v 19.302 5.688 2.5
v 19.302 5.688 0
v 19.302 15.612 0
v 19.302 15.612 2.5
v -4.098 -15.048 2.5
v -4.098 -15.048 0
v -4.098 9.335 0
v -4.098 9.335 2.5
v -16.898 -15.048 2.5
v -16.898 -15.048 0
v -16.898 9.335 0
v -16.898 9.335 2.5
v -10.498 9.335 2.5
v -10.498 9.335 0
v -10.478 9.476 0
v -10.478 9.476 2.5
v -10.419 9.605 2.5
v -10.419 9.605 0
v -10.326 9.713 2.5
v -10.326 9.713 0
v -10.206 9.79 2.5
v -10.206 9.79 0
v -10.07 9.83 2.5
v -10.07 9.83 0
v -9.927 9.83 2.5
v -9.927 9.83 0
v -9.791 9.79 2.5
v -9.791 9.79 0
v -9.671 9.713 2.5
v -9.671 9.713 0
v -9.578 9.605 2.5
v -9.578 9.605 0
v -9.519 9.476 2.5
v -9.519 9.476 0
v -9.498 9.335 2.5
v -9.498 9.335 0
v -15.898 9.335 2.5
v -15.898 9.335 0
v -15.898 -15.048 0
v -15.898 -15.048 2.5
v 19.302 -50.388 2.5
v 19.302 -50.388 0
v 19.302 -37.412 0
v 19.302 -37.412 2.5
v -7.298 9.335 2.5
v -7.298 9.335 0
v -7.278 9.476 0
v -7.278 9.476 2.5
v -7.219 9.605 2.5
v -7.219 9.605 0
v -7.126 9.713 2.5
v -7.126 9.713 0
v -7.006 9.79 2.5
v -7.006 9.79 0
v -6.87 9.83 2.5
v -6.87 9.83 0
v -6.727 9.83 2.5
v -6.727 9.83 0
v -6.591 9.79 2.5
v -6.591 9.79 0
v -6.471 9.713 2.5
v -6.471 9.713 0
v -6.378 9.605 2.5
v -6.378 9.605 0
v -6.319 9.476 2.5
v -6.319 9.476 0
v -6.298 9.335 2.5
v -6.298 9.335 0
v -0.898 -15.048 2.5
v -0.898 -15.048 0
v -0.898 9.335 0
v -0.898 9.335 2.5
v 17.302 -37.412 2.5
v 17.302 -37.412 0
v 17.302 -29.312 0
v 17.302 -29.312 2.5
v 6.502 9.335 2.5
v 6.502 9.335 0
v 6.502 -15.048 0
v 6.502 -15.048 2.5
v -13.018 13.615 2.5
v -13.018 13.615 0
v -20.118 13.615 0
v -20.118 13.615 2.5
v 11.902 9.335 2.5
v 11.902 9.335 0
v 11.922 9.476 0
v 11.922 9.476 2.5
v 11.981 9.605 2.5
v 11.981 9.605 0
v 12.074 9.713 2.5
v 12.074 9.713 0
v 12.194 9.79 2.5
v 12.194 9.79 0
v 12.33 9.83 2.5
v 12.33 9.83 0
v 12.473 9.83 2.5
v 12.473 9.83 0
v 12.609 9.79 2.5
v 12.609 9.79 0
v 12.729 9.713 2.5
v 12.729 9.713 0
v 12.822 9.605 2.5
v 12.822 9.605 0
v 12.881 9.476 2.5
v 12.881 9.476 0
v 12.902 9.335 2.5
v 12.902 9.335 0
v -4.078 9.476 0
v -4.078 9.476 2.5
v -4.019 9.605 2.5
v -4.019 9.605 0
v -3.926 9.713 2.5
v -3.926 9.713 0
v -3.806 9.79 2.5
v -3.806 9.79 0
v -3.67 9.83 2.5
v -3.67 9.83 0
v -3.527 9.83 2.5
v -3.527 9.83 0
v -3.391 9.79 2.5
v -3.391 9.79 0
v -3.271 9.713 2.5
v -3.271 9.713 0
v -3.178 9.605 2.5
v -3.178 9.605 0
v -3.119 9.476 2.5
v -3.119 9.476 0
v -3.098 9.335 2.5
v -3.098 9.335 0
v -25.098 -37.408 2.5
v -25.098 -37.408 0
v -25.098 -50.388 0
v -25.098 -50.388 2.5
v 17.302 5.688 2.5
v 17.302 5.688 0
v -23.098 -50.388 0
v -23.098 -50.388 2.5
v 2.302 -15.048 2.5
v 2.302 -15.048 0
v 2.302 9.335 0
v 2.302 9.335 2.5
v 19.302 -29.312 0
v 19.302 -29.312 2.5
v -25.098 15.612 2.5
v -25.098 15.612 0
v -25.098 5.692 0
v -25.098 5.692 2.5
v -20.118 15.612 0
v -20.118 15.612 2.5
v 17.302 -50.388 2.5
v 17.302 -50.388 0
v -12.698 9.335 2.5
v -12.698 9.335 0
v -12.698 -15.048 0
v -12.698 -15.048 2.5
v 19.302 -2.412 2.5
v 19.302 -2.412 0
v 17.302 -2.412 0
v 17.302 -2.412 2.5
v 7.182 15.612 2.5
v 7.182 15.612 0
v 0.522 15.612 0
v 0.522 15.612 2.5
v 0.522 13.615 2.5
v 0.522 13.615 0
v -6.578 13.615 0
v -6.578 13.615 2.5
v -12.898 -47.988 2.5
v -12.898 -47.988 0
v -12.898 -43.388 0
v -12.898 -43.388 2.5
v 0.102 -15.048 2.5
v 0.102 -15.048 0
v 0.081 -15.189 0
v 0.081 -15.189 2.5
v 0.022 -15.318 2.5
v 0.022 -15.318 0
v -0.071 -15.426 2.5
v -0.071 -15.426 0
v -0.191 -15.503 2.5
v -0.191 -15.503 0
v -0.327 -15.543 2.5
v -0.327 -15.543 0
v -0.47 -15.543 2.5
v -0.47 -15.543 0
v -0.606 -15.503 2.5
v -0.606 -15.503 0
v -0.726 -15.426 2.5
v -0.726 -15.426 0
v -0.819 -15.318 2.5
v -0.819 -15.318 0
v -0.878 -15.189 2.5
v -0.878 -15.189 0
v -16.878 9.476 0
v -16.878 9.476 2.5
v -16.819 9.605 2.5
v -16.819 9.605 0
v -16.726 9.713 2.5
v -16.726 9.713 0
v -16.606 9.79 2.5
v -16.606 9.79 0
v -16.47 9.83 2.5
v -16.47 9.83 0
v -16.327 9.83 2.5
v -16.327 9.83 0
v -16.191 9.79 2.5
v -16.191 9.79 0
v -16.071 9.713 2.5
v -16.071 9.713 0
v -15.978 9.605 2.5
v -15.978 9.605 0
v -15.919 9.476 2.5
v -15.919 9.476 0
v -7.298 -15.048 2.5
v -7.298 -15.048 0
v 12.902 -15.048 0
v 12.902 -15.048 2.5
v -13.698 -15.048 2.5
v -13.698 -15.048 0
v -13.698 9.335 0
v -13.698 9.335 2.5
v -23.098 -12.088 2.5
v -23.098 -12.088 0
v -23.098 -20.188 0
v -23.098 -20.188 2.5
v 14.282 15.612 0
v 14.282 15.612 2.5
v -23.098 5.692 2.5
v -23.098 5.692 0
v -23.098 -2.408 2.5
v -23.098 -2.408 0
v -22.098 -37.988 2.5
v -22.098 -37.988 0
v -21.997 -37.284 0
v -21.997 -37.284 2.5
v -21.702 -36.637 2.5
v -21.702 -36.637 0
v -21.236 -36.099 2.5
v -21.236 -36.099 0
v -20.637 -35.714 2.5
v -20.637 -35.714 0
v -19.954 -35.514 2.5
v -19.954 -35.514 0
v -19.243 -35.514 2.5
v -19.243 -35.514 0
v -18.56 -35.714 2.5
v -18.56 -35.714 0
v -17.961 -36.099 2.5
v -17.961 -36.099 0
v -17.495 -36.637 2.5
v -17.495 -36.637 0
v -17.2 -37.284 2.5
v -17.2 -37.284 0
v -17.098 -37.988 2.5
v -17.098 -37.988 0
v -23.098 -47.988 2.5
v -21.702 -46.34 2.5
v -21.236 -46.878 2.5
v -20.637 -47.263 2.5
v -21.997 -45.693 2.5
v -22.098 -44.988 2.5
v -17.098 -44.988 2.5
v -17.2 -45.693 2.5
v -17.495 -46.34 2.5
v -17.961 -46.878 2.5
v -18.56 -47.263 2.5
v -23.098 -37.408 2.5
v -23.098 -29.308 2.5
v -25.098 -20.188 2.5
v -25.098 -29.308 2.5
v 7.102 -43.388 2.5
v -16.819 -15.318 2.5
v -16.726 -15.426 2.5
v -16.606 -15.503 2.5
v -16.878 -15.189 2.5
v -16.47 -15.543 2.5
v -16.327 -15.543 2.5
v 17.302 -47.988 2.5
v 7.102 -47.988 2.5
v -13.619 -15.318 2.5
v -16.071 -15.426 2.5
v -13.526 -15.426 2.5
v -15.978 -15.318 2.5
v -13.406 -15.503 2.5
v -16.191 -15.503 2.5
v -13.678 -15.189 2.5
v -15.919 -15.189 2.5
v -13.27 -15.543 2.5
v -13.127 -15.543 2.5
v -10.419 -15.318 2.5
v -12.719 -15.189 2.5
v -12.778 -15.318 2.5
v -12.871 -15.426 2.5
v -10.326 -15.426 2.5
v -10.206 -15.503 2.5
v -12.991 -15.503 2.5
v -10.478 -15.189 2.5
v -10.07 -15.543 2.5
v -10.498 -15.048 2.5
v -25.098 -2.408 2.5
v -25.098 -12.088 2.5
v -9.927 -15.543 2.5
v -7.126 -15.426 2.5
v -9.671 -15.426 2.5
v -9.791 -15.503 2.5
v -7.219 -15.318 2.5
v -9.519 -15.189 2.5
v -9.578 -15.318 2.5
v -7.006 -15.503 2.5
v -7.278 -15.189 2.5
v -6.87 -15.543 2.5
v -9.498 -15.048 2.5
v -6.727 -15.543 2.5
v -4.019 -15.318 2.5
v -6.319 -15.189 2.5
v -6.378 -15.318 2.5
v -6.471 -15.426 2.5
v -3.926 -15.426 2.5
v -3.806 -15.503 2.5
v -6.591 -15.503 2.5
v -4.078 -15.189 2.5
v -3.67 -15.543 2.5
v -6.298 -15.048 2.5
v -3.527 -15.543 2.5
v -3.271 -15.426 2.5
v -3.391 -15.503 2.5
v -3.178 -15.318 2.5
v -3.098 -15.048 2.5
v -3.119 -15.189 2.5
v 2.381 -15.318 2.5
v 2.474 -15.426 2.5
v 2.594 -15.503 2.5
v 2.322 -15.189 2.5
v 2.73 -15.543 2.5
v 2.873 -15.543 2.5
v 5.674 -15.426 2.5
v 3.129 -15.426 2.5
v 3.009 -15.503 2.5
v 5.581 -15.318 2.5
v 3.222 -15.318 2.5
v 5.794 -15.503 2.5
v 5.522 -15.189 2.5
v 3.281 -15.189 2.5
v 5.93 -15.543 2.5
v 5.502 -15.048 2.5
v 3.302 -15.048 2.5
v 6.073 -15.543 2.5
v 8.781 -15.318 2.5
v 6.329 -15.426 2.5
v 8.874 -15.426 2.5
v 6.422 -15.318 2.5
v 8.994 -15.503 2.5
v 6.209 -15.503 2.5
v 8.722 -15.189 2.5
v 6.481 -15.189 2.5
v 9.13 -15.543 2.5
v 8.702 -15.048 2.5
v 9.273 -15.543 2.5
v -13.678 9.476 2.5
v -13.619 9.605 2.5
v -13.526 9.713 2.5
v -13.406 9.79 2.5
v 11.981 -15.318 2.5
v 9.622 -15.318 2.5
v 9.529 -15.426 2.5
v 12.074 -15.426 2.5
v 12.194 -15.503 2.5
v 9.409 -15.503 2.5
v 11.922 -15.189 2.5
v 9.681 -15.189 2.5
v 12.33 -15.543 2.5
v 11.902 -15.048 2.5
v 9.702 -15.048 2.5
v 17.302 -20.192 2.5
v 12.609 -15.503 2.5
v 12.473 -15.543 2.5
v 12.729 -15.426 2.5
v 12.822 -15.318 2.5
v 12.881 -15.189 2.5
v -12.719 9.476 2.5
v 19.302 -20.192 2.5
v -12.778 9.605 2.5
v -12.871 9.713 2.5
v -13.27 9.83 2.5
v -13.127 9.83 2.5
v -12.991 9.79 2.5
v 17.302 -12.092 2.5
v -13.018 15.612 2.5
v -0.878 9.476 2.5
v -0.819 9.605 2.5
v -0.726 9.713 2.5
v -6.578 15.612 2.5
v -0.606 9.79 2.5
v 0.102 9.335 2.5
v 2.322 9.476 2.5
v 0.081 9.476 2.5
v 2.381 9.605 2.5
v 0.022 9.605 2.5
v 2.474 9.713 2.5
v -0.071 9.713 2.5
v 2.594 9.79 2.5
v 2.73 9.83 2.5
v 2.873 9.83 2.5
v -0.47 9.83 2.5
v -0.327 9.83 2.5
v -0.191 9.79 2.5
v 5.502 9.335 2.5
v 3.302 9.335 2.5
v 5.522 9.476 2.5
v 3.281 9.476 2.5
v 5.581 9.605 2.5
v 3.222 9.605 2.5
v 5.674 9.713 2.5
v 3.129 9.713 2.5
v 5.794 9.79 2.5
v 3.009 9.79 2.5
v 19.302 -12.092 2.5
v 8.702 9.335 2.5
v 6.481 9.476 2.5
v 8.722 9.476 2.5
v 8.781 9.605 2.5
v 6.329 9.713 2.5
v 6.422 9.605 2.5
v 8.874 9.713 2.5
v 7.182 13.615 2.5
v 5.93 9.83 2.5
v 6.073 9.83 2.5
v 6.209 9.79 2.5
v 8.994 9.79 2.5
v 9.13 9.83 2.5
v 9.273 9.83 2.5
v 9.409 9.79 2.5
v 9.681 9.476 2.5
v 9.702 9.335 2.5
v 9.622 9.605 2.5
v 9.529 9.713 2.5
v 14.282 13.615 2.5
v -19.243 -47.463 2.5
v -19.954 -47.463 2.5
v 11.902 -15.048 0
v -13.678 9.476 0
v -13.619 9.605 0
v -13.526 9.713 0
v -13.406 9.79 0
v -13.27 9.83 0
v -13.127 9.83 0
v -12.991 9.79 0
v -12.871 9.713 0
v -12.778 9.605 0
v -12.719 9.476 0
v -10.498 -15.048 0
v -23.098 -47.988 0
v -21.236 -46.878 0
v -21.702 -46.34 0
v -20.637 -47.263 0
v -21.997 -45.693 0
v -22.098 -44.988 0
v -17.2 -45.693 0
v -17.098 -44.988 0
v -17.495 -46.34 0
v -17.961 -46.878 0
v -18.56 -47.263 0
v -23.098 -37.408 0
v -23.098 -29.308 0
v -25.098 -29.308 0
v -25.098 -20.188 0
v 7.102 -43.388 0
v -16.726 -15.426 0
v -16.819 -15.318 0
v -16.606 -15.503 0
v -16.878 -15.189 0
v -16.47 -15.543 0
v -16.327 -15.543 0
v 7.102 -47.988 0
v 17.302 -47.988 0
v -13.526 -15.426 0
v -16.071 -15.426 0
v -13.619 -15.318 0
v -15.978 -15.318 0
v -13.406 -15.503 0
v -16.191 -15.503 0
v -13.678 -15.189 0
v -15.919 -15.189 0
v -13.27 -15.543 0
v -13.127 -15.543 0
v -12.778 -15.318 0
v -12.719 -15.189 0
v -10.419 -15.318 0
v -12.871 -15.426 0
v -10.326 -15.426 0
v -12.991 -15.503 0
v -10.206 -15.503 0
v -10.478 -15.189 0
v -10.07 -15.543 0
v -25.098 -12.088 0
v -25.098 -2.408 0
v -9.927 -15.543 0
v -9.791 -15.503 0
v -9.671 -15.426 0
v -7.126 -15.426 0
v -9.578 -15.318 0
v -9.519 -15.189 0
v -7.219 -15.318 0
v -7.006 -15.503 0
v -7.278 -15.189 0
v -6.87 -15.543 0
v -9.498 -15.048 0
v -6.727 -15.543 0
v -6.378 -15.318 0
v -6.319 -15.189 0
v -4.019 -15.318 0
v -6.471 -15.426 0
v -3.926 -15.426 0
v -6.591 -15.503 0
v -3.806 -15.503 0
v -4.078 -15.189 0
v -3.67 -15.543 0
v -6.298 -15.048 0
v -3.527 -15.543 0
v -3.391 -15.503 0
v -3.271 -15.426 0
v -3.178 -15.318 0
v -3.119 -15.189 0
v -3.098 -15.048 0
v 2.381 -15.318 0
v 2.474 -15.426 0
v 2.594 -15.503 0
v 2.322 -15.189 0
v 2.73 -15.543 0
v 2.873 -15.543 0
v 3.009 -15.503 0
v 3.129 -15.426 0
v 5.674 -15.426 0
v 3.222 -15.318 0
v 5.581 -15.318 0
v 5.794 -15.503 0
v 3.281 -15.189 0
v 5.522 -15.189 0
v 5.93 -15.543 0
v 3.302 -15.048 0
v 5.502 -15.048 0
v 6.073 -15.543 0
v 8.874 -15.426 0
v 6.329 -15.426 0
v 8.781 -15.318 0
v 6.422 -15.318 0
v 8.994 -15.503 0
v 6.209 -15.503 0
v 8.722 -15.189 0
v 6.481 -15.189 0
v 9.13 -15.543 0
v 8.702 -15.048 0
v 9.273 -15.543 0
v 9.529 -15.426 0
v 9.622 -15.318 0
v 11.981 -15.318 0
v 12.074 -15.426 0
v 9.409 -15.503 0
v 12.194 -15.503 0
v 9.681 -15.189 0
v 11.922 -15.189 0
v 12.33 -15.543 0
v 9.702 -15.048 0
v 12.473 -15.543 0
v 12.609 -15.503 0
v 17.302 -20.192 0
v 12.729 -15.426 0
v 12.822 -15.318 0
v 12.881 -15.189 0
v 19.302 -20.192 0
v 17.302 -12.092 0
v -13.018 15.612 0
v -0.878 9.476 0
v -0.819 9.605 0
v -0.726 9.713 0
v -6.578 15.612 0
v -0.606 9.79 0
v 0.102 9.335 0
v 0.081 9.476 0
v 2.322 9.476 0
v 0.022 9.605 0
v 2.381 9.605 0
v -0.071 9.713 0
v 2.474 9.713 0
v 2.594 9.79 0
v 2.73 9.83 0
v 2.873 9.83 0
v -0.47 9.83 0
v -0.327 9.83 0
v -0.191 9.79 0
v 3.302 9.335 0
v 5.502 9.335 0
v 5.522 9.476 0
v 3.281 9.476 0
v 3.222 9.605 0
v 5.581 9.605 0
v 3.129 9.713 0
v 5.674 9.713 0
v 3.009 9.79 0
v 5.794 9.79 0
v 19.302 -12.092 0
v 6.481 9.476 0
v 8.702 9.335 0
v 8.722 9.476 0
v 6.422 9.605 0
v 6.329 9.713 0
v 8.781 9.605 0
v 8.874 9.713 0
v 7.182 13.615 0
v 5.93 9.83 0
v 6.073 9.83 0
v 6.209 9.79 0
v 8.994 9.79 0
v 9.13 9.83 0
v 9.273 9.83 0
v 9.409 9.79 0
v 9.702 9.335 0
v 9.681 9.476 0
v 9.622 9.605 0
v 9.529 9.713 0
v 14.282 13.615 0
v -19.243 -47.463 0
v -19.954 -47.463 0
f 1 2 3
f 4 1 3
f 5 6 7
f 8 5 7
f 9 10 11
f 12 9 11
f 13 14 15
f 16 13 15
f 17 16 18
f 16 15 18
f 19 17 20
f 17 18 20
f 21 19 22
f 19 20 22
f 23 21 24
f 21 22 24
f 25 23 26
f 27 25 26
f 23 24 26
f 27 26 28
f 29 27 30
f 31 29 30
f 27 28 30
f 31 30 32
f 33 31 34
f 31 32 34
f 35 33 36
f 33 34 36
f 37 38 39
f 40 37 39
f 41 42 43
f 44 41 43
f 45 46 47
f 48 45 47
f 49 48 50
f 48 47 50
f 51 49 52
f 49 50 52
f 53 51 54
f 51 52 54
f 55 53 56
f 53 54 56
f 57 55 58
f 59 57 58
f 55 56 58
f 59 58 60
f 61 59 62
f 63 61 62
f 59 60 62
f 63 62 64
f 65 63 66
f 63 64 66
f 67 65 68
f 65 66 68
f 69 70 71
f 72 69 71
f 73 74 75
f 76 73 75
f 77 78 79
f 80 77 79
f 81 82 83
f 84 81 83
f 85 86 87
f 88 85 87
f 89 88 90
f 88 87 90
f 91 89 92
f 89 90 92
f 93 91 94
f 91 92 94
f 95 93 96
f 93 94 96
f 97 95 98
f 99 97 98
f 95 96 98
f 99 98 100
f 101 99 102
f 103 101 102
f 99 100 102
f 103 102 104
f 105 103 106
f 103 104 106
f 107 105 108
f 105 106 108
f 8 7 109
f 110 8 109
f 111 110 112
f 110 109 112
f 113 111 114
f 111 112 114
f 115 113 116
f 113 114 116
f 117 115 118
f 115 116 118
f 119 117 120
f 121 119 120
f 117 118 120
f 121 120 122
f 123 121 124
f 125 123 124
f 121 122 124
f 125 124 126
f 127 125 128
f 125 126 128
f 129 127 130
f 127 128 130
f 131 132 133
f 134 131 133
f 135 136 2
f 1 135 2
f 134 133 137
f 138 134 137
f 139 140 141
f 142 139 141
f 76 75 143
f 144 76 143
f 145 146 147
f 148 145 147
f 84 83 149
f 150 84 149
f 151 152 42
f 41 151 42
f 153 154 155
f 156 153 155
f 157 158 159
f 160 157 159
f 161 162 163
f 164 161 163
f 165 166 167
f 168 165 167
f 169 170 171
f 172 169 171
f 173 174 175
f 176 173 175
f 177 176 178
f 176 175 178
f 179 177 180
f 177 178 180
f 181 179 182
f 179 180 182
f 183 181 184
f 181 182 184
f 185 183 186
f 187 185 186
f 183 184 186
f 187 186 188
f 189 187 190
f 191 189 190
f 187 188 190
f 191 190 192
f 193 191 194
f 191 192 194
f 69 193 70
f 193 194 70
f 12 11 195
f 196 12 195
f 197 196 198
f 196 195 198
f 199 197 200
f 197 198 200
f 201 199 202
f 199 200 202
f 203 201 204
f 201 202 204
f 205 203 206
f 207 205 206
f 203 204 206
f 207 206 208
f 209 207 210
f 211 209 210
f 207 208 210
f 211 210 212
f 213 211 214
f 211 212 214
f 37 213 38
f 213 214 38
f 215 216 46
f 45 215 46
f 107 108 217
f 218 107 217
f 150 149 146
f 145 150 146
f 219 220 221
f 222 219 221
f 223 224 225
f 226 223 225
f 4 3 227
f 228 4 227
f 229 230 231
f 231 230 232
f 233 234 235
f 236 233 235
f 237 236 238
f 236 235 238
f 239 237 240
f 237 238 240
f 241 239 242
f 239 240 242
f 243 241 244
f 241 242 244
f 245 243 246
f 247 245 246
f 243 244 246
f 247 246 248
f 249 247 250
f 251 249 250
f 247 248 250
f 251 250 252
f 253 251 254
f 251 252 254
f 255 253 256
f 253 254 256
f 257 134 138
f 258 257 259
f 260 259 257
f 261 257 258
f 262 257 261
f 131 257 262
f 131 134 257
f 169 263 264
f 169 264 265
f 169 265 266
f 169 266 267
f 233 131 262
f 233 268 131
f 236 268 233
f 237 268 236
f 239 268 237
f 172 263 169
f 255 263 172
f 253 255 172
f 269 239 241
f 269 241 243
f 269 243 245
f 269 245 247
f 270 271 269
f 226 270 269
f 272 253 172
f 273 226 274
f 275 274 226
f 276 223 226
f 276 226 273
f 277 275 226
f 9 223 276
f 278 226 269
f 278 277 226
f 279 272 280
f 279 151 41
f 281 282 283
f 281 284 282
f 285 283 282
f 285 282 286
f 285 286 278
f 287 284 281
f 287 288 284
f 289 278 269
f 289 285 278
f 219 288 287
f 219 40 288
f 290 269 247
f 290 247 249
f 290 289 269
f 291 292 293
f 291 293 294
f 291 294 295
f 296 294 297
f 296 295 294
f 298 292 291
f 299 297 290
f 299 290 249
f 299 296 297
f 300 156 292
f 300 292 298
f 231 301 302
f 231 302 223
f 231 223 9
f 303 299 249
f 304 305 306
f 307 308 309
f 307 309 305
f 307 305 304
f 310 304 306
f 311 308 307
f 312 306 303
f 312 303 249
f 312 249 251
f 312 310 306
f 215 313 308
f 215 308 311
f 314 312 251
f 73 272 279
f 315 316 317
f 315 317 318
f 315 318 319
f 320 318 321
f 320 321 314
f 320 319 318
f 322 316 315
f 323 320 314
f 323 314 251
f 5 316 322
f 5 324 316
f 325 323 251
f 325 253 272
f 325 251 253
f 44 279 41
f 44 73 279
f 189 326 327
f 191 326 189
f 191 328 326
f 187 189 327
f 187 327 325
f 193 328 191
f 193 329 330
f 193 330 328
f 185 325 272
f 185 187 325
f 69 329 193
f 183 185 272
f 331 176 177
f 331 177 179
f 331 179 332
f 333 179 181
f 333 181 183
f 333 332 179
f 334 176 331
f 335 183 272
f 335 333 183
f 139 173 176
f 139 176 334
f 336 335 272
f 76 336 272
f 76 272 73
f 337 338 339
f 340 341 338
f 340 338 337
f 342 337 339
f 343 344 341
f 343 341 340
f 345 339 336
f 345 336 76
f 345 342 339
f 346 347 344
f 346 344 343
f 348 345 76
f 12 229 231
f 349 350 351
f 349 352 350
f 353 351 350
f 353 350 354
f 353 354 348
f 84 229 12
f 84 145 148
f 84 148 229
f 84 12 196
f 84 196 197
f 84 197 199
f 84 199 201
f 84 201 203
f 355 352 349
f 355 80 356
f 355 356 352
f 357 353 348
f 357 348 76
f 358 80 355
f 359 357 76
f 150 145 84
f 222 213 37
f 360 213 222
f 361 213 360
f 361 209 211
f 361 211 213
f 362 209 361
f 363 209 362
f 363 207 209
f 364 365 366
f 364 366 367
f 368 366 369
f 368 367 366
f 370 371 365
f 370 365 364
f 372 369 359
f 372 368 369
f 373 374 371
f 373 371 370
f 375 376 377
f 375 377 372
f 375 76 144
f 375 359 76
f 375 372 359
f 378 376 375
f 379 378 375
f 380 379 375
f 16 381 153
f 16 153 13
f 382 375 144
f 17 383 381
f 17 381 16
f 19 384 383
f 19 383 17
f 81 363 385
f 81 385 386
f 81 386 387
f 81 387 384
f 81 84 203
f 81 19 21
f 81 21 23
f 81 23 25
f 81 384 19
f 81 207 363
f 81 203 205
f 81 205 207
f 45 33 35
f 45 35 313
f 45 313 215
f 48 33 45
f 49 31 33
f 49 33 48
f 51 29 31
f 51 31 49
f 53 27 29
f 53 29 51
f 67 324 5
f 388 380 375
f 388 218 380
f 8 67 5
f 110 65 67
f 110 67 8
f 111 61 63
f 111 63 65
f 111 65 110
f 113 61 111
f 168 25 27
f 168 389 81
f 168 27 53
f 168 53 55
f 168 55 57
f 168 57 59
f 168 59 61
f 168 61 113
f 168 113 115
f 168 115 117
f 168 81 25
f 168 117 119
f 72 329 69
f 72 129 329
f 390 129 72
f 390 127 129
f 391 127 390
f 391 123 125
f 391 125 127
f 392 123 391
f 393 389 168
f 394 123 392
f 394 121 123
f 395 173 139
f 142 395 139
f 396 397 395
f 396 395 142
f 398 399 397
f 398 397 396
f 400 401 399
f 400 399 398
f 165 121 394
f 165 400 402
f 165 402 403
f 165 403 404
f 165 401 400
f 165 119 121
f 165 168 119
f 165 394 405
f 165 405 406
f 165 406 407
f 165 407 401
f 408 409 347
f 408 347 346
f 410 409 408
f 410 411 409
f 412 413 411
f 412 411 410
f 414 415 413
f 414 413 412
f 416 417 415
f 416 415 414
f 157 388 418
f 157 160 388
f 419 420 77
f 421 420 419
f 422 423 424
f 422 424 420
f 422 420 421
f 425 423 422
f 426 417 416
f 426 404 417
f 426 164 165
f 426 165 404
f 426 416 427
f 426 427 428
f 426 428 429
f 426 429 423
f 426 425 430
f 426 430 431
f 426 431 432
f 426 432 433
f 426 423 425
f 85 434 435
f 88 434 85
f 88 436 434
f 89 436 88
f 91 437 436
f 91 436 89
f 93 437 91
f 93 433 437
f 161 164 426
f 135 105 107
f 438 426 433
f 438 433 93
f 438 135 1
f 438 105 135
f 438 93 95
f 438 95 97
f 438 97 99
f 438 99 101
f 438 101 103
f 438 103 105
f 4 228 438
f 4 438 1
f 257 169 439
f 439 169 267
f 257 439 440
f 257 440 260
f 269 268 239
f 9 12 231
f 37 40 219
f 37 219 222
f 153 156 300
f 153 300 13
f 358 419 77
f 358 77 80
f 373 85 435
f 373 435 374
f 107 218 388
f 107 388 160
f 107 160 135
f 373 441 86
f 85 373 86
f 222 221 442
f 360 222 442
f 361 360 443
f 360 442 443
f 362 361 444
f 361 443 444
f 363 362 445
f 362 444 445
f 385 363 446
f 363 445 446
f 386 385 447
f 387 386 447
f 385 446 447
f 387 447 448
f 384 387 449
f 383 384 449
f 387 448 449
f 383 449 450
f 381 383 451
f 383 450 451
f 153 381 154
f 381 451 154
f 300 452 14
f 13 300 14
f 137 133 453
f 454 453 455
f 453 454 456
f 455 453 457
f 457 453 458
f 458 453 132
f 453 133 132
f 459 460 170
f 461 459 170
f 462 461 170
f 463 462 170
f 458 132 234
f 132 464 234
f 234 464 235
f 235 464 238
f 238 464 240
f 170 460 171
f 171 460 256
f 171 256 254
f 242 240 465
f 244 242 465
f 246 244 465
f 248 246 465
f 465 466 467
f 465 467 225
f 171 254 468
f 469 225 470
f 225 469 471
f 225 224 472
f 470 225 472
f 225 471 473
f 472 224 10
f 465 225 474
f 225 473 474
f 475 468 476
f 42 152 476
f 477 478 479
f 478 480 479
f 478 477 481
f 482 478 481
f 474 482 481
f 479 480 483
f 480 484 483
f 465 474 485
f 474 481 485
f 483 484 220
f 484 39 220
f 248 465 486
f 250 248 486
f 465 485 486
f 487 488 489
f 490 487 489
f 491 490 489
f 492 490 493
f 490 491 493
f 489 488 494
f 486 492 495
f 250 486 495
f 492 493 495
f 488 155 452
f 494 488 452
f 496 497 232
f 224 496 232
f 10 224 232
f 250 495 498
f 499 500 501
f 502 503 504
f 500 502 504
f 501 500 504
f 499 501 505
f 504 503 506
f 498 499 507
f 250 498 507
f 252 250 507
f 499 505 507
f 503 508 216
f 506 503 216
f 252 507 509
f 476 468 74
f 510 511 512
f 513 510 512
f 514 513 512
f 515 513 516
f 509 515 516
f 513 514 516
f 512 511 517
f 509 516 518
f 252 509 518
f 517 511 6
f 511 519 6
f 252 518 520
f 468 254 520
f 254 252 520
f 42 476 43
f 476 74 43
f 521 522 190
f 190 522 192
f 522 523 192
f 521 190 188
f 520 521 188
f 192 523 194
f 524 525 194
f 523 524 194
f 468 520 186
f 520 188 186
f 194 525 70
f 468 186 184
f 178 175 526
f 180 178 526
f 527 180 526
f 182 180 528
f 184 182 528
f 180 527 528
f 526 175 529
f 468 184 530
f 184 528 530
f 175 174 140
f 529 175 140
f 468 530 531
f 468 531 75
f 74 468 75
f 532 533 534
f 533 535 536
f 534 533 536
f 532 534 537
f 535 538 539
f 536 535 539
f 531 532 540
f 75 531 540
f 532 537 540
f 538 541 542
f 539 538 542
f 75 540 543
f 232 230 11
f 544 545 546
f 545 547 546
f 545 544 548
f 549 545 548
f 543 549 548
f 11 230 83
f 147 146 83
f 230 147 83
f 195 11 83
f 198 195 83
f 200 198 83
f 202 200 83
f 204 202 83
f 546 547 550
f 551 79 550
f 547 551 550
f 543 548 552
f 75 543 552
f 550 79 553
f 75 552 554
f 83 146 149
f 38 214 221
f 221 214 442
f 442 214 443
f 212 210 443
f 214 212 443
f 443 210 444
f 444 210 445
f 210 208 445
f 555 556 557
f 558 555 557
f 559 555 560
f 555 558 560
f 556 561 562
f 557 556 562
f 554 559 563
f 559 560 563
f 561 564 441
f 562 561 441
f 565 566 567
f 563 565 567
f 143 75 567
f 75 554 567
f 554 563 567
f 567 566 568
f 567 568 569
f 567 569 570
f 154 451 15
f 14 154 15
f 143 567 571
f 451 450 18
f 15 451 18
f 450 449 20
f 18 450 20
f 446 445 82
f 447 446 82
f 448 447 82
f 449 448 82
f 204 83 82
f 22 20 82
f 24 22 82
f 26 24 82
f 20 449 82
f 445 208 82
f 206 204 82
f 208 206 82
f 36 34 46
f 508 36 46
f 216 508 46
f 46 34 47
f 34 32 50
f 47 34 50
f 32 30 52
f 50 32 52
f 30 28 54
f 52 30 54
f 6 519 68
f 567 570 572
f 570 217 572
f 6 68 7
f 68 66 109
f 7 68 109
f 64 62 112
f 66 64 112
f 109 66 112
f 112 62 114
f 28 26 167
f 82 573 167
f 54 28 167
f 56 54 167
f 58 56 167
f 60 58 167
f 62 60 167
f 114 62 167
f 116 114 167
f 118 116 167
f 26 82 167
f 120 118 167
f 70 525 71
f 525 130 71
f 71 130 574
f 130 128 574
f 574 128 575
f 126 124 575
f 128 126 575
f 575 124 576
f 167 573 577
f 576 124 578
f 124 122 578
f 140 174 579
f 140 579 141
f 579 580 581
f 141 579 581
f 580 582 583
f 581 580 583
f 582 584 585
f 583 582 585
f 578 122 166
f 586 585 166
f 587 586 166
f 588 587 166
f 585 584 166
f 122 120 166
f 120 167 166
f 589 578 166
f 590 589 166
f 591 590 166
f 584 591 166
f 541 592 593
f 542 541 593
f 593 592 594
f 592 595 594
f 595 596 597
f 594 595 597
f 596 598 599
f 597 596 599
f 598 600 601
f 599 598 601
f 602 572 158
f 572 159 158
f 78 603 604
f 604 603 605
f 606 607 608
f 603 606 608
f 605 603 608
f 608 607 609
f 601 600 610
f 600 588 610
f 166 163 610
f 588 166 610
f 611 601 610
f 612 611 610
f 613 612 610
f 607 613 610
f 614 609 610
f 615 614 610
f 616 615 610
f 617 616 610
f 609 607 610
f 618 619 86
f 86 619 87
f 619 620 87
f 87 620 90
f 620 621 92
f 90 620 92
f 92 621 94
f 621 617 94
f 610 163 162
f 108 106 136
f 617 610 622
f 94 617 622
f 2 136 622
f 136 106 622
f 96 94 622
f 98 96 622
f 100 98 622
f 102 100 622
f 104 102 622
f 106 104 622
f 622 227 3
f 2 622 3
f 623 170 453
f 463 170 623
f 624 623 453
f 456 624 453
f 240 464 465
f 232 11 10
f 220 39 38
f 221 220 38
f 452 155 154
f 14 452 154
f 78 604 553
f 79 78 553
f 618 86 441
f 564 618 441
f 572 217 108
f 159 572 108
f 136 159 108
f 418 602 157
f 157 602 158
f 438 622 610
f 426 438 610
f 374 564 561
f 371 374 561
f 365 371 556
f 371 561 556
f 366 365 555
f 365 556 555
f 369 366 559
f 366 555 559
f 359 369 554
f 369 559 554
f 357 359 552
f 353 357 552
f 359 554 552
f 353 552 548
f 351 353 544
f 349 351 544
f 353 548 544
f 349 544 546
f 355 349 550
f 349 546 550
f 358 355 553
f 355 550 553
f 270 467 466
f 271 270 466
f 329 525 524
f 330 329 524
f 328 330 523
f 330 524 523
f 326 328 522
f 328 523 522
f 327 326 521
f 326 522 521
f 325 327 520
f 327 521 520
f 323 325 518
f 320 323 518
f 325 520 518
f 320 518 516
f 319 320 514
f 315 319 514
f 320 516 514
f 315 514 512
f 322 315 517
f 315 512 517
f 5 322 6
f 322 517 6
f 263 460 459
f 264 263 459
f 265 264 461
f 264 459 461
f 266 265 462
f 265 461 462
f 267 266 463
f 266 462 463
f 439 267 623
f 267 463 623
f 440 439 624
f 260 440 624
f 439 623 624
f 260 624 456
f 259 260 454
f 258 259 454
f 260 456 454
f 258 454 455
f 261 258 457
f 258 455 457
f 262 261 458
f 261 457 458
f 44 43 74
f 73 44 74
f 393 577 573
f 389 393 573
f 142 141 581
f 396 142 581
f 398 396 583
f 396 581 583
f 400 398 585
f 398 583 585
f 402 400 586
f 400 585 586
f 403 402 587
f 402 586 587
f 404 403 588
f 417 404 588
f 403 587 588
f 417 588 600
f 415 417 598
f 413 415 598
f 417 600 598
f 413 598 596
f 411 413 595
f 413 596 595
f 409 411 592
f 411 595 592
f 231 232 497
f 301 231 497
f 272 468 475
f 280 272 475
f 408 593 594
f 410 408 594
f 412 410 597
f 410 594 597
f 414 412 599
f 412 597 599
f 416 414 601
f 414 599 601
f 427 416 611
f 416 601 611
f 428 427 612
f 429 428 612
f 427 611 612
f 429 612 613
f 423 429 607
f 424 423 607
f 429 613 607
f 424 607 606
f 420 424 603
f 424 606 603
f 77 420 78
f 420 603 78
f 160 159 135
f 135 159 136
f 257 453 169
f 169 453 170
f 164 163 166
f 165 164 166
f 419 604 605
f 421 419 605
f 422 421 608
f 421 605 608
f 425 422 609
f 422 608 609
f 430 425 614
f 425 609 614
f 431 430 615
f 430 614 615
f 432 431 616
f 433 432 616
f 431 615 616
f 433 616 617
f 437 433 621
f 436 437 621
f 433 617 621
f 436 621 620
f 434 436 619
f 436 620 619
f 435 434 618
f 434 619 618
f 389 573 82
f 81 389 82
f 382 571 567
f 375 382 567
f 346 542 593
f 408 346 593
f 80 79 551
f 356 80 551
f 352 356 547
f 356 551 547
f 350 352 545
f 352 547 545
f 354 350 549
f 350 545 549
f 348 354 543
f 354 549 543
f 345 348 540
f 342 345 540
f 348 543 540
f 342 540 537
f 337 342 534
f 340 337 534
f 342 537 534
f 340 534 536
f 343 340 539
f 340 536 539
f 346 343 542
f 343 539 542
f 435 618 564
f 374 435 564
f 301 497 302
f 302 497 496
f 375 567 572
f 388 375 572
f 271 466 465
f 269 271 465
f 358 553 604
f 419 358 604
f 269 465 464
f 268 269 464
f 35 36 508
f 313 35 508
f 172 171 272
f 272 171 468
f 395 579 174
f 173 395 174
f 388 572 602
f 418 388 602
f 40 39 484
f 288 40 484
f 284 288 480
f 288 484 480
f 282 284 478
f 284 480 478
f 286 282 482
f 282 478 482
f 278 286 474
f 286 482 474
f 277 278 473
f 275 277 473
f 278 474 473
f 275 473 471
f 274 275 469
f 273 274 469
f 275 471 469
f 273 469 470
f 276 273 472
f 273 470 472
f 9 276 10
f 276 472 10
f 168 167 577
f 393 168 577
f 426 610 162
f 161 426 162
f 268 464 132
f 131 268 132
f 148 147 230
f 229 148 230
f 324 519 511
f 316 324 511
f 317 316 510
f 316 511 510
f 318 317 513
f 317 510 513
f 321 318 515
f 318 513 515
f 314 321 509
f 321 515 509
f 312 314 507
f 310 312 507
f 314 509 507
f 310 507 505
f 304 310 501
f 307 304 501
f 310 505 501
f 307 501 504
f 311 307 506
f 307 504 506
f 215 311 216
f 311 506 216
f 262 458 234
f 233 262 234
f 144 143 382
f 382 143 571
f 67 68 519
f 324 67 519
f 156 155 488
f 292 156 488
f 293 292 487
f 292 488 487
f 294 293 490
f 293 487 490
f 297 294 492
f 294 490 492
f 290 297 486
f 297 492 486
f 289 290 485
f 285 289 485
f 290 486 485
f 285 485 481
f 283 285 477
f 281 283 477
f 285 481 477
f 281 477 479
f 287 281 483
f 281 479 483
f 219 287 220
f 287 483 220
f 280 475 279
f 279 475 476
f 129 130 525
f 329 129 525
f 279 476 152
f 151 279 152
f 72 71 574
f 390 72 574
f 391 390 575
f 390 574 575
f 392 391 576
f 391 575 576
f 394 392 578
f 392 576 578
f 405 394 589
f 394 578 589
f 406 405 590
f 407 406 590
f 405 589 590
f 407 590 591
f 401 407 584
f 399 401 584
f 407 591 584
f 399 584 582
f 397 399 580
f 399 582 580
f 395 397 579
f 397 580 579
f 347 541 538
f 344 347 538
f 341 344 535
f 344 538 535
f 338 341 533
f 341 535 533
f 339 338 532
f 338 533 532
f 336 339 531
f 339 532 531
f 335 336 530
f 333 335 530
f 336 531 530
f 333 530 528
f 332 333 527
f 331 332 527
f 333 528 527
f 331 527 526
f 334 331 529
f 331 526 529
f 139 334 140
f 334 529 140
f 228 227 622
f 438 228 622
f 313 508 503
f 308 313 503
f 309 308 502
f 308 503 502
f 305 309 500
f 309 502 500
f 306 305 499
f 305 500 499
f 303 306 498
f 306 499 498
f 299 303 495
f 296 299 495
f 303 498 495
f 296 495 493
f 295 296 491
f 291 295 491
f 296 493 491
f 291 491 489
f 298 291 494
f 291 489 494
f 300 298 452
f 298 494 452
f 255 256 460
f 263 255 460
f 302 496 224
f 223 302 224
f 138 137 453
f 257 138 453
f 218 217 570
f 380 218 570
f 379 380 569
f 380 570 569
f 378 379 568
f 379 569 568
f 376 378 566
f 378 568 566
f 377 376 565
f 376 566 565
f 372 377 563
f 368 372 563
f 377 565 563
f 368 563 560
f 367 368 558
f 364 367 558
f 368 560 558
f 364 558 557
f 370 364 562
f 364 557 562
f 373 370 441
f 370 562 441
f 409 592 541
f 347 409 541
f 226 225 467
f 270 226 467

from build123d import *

# Parameters (mm, degrees)
RESSALTO_EXTRUS_O1_DEPTH = 2.5


with BuildPart() as part:
    # Esboço1 → Ressalto-extrusão1 (new body)
    with BuildSketch(Plane.XY):
        Polygon((-25.098396903, -50.388461043), (-23.098396903, -50.388461043), (-23.098396903, -47.988461043), (-12.898396903, -47.988461043), (-12.898396903, -43.388461043), (7.101603097, -43.388461043), (7.101603097, -47.988461043), (17.301603097, -47.988461043), (17.301603097, -50.388461043), (19.301603097, -50.388461043), (19.301603097, -37.412155135), (17.301603097, -37.412155135), (17.301603097, -29.312155135), (19.301603097, -29.312155135), (19.301603097, -20.19154649), (17.301603097, -20.19154649), (17.301603097, -12.09154649), (19.301603097, -12.09154649), (19.301603097, -2.411827174), (17.301603097, -2.411827174), (17.301603097, 5.688172826), (19.301603097, 5.688172826), (19.301603097, 15.611538957), (14.281603097, 15.611538957), (14.281603097, 13.615257293), (7.181603097, 13.615257293), (7.181603097, 15.611538957), (0.521603097, 15.611538957), (0.521603097, 13.615257293), (-6.578396903, 13.615257293), (-6.578396903, 15.611538957), (-13.018396903, 15.611538957), (-13.018396903, 13.615257293), (-20.118396903, 13.615257293), (-20.118396903, 15.611538957), (-25.098396903, 15.611538957), (-25.098396903, 5.691538957), (-23.098396903, 5.691538957), (-23.098396903, -2.408461043), (-25.098396903, -2.408461043), (-25.098396903, -12.088461043), (-23.098396903, -12.088461043), (-23.098396903, -20.188461043), (-25.098396903, -20.188461043), (-25.098396903, -29.308461043), (-23.098396903, -29.308461043), (-23.098396903, -37.408461043), (-25.098396903, -37.408461043), align=None)
        with BuildLine():
            ThreePointArc((-22.098396903, -37.988461043), (-19.598396903, -35.488461043), (-17.098396903, -37.988461043))
            Line((-17.098396903, -37.988461043), (-17.098396903, -44.988461043))
            ThreePointArc((-17.098396903, -44.988461043), (-19.598396903, -47.488461043), (-22.098396903, -44.988461043))
            Line((-22.098396903, -44.988461043), (-22.098396903, -37.988461043))
        make_face(mode=Mode.SUBTRACT)
        with BuildLine():
            ThreePointArc((-16.898396903, 9.334849068), (-16.398396903, 9.834849068), (-15.898396903, 9.334849068))
            Line((-15.898396903, 9.334849068), (-15.898396903, -15.047771388))
            ThreePointArc((-15.898396903, -15.047771388), (-16.398396903, -15.547771388), (-16.898396903, -15.047771388))
            Line((-16.898396903, -15.047771388), (-16.898396903, 9.334849068))
        make_face(mode=Mode.SUBTRACT)
        with BuildLine():
            ThreePointArc((-13.698396903, 9.334849068), (-13.198396903, 9.834849068), (-12.698396903, 9.334849068))
            Line((-12.698396903, 9.334849068), (-12.698396903, -15.047771388))
            ThreePointArc((-12.698396903, -15.047771388), (-13.198396903, -15.547771388), (-13.698396903, -15.047771388))
            Line((-13.698396903, -15.047771388), (-13.698396903, 9.334849068))
        make_face(mode=Mode.SUBTRACT)
        with BuildLine():
            ThreePointArc((-10.498396903, 9.334849068), (-9.998396903, 9.834849068), (-9.498396903, 9.334849068))
            Line((-9.498396903, 9.334849068), (-9.498396903, -15.047771388))
            ThreePointArc((-9.498396903, -15.047771388), (-9.998396903, -15.547771388), (-10.498396903, -15.047771388))
            Line((-10.498396903, -15.047771388), (-10.498396903, 9.334849068))
        make_face(mode=Mode.SUBTRACT)
        with BuildLine():
            ThreePointArc((-7.298396903, 9.334849068), (-6.798396903, 9.834849068), (-6.298396903, 9.334849068))
            Line((-6.298396903, 9.334849068), (-6.298396903, -15.047771388))
            ThreePointArc((-6.298396903, -15.047771388), (-6.798396903, -15.547771388), (-7.298396903, -15.047771388))
            Line((-7.298396903, -15.047771388), (-7.298396903, 9.334849068))
        make_face(mode=Mode.SUBTRACT)
        with BuildLine():
            ThreePointArc((-4.098396903, 9.334849068), (-3.598396903, 9.834849068), (-3.098396903, 9.334849068))
            Line((-3.098396903, 9.334849068), (-3.098396903, -15.047771388))
            ThreePointArc((-3.098396903, -15.047771388), (-3.598396903, -15.547771388), (-4.098396903, -15.047771388))
            Line((-4.098396903, -15.047771388), (-4.098396903, 9.334849068))
        make_face(mode=Mode.SUBTRACT)
        with BuildLine():
            ThreePointArc((-0.898396903, 9.334849068), (-0.398396903, 9.834849068), (0.101603097, 9.334849068))
            Line((0.101603097, 9.334849068), (0.101603097, -15.047771388))
            ThreePointArc((0.101603097, -15.047771388), (-0.398396903, -15.547771388), (-0.898396903, -15.047771388))
            Line((-0.898396903, -15.047771388), (-0.898396903, 9.334849068))
        make_face(mode=Mode.SUBTRACT)
        with BuildLine():
            ThreePointArc((2.301603097, 9.334849068), (2.801603097, 9.834849068), (3.301603097, 9.334849068))
            Line((3.301603097, 9.334849068), (3.301603097, -15.047771388))
            ThreePointArc((3.301603097, -15.047771388), (2.801603097, -15.547771388), (2.301603097, -15.047771388))
            Line((2.301603097, -15.047771388), (2.301603097, 9.334849068))
        make_face(mode=Mode.SUBTRACT)
        with BuildLine():
            ThreePointArc((5.501603097, 9.334849068), (6.001603097, 9.834849068), (6.501603097, 9.334849068))
            Line((6.501603097, 9.334849068), (6.501603097, -15.047771388))
            ThreePointArc((6.501603097, -15.047771388), (6.001603097, -15.547771388), (5.501603097, -15.047771388))
            Line((5.501603097, -15.047771388), (5.501603097, 9.334849068))
        make_face(mode=Mode.SUBTRACT)
        with BuildLine():
            ThreePointArc((8.701603097, 9.334849068), (9.201603097, 9.834849068), (9.701603097, 9.334849068))
            Line((9.701603097, 9.334849068), (9.701603097, -15.047771388))
            ThreePointArc((9.701603097, -15.047771388), (9.201603097, -15.547771388), (8.701603097, -15.047771388))
            Line((8.701603097, -15.047771388), (8.701603097, 9.334849068))
        make_face(mode=Mode.SUBTRACT)
        with BuildLine():
            ThreePointArc((11.901603097, 9.334849068), (12.401603097, 9.834849068), (12.901603097, 9.334849068))
            Line((12.901603097, 9.334849068), (12.901603097, -15.047771388))
            ThreePointArc((12.901603097, -15.047771388), (12.401603097, -15.547771388), (11.901603097, -15.047771388))
            Line((11.901603097, -15.047771388), (11.901603097, 9.334849068))
        make_face(mode=Mode.SUBTRACT)
    extrude(amount=RESSALTO_EXTRUS_O1_DEPTH)


solid = part.part
